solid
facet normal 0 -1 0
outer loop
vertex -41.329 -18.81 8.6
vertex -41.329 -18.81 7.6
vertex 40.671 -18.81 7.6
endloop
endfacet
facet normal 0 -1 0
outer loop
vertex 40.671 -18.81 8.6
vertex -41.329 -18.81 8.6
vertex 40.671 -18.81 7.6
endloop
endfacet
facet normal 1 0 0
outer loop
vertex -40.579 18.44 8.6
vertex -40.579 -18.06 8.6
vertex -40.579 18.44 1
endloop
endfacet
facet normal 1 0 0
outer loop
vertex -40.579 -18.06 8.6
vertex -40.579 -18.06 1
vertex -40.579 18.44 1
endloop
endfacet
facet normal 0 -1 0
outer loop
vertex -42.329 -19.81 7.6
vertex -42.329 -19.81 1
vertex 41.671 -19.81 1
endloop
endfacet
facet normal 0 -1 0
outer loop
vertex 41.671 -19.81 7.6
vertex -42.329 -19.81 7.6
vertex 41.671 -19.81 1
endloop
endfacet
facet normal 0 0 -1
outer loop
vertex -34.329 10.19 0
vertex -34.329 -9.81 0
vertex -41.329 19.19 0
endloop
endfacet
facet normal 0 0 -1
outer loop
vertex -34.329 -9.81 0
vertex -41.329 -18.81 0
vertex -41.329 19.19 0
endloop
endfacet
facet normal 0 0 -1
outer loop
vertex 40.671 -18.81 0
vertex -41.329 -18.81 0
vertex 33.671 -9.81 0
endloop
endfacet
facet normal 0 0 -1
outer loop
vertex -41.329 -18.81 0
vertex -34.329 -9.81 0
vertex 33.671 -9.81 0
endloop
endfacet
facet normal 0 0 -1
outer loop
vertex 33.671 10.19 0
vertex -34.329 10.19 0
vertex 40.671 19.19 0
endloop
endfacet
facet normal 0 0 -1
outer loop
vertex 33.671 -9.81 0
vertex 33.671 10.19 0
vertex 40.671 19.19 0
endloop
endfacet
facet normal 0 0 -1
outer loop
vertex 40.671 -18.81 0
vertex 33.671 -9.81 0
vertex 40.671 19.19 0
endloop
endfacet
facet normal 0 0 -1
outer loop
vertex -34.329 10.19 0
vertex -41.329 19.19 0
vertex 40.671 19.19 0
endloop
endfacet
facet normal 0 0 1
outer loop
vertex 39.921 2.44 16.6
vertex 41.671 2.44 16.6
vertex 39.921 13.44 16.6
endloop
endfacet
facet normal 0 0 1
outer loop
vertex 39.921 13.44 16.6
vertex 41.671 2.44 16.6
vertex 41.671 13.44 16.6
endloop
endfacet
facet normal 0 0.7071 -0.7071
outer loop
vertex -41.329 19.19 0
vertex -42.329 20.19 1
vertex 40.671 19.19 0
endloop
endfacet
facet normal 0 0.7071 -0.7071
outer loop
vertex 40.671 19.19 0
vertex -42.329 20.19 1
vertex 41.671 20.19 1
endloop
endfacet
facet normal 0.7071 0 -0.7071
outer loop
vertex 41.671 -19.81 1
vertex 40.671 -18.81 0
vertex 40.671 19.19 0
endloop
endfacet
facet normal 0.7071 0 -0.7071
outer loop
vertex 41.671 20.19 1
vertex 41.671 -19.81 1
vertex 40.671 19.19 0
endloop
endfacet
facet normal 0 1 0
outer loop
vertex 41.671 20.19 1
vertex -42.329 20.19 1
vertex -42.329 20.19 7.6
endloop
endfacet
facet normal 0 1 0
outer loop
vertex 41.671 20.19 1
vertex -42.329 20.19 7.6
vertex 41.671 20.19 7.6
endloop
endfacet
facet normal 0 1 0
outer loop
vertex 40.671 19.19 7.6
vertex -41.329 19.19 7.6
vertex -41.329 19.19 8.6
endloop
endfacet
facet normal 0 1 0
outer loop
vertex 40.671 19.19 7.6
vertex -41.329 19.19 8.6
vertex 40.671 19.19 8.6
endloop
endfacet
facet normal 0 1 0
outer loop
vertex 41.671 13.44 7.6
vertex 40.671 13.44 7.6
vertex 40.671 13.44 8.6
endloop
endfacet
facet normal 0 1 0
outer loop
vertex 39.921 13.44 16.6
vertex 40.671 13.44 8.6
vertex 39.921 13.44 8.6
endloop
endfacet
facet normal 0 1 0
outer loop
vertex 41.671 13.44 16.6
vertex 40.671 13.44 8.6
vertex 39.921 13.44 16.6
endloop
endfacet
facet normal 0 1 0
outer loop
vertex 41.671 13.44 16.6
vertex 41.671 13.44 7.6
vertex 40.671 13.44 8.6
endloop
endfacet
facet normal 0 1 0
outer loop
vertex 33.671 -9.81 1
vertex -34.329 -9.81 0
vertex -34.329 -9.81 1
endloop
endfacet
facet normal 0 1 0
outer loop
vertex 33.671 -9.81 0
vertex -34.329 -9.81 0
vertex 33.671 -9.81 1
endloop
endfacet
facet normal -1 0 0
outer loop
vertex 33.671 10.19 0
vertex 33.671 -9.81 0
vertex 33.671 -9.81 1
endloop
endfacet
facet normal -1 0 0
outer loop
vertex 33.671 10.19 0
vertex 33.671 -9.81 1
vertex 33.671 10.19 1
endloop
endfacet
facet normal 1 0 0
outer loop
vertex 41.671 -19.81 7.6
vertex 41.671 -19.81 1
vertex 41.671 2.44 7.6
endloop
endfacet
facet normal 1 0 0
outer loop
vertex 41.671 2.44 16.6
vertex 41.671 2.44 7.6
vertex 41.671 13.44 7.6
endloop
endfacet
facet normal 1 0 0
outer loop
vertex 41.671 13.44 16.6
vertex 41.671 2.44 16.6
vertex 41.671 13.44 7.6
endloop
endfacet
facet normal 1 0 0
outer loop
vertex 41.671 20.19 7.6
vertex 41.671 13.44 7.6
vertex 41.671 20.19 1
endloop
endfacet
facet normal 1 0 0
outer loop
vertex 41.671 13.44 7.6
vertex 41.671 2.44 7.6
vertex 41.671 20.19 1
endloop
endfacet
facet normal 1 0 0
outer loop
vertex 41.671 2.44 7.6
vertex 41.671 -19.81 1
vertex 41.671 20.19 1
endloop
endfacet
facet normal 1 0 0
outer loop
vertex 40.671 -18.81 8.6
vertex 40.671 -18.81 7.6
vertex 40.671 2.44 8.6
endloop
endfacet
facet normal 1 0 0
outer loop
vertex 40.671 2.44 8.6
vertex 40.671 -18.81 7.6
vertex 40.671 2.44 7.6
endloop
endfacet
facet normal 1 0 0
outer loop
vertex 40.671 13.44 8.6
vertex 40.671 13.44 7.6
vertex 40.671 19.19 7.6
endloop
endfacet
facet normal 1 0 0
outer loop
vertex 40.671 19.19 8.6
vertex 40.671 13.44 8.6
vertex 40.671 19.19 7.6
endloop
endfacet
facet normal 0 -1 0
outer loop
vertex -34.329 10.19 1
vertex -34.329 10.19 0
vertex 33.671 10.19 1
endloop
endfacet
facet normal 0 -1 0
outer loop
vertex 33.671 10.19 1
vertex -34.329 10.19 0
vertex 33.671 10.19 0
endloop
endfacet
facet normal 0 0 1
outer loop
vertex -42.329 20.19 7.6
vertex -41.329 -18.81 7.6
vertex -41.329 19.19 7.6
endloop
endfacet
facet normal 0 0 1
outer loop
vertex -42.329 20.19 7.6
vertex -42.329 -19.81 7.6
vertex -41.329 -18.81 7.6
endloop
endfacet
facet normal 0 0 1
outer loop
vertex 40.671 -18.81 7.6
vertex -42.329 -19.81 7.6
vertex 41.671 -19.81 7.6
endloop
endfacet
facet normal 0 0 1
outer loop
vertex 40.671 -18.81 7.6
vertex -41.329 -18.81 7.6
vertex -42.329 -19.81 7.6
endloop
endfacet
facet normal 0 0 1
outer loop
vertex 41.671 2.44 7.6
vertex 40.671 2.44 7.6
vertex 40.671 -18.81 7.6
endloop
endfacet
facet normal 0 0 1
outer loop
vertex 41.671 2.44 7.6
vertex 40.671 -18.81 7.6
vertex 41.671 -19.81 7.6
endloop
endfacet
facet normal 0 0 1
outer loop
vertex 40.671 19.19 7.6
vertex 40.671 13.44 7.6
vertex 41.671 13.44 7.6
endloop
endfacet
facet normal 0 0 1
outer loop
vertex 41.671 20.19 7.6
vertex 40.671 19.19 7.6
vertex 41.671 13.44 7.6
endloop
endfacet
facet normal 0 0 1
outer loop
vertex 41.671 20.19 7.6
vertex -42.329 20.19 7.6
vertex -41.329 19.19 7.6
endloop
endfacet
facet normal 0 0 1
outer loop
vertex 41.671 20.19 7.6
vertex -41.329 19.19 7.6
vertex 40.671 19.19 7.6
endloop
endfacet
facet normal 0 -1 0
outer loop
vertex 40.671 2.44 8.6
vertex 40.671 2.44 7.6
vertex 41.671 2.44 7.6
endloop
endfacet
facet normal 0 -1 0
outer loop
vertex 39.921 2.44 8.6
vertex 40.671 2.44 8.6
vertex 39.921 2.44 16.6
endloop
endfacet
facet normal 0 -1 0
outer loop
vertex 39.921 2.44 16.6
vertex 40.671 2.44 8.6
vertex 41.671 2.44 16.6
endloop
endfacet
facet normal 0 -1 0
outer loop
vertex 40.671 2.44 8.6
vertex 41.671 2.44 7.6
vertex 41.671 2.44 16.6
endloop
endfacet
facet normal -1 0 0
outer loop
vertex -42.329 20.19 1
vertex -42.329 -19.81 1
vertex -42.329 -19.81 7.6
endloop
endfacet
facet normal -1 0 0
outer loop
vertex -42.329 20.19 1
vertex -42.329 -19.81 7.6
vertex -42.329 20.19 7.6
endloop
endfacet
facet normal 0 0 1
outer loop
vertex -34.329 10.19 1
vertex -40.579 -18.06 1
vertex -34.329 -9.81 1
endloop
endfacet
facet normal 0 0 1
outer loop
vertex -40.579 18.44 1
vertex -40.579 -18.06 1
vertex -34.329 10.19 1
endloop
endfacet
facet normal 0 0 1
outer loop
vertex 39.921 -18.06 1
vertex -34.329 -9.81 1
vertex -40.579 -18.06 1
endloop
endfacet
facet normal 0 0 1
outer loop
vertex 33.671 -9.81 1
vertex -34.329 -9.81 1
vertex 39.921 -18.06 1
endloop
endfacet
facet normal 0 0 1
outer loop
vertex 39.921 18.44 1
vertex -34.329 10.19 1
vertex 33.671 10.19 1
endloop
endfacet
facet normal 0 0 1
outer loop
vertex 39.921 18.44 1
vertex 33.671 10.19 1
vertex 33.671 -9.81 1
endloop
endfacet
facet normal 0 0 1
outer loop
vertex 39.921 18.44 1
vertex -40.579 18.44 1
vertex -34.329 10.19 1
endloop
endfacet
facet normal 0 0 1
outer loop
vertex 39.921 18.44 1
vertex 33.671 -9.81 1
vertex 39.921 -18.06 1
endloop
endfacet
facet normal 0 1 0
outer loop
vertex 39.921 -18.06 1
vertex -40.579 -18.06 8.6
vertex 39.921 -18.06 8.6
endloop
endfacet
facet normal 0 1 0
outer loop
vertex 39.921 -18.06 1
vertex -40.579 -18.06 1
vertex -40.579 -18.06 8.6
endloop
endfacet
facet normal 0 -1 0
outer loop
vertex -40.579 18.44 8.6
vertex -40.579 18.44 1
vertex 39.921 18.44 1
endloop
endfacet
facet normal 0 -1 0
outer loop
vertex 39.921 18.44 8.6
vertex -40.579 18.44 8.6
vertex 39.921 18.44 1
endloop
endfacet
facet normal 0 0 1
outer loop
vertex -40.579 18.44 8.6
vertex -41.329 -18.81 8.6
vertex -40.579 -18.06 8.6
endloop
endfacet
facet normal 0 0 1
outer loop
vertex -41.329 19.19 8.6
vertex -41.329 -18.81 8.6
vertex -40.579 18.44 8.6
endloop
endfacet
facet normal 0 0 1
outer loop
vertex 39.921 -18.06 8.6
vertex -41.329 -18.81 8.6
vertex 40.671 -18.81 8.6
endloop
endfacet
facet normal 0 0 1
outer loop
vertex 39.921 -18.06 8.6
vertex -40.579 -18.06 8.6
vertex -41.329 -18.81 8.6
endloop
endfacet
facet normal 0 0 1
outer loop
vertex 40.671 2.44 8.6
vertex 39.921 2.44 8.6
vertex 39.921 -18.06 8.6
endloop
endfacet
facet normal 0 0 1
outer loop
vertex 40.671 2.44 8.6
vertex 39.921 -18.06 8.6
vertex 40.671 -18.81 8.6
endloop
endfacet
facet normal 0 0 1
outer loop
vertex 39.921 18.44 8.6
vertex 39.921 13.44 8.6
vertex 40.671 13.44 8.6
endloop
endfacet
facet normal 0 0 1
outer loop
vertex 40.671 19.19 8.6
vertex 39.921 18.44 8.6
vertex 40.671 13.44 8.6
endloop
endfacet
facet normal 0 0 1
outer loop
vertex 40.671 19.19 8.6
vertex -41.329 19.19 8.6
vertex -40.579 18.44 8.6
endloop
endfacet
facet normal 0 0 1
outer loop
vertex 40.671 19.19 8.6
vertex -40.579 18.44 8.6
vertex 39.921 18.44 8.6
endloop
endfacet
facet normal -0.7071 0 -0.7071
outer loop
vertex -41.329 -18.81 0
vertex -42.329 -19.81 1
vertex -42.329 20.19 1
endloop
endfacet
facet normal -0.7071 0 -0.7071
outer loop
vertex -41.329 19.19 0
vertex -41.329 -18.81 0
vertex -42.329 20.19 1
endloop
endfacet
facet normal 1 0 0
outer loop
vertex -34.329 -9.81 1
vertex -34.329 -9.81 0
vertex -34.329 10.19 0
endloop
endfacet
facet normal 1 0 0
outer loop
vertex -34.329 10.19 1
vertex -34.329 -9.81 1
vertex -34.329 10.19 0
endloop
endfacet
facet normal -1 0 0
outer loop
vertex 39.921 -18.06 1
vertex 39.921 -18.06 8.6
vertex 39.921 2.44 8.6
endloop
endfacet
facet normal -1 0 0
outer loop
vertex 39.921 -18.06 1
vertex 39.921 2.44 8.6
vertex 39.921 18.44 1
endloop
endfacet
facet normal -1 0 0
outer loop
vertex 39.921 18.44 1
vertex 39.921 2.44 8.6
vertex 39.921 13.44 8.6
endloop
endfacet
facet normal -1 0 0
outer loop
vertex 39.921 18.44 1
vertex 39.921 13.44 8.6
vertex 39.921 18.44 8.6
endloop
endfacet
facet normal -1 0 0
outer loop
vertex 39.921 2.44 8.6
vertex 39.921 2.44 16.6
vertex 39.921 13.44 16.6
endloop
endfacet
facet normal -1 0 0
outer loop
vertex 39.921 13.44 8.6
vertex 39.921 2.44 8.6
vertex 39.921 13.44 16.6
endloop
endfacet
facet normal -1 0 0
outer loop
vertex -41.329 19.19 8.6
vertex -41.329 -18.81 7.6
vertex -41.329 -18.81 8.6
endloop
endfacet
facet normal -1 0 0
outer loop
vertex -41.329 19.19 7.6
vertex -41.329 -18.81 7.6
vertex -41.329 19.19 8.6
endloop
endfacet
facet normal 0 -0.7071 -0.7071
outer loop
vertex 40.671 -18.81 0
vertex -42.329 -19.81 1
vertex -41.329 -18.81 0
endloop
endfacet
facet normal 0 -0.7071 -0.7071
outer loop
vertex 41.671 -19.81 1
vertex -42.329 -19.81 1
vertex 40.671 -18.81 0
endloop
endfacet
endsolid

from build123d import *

# Parameters (mm, degrees)
F0_W     = 84
F0_H     = 40
F0_R     = 1.45
F1_DEPTH = 1
F2_DEPTH = 7.6
F3_W     = 82
F3_H     = 38
F3_W_2   = 80.5
F3_H_2   = 36.5
F4_DEPTH = 1
F5_W     = 68
F5_H     = 20
F6_DEPTH = 5
F7_W     = 11
F7_H     = 13.6534924152
F8_DEPTH = 1.75
F9_SIZE  = 1


with BuildPart() as f1:
    # F0 (on Top) → F1 (new body)
    with BuildSketch(Plane.XY):
        with Locations((-0.3290896534, 0.19)):
            Rectangle(F0_W, F0_H)
        Polygon((-40.5790896534, 13.39), (-40.5790896534, 18.44), (-35.5290896534, 18.44), (34.8709103466, 18.44), (39.9209103466, 18.44), (39.9209103466, 13.39), (39.9209103466, -13.01), (39.9209103466, -18.06), (34.8709103466, -18.06), (-35.5290896534, -18.06), (-40.5790896534, -18.06), (-40.5790896534, -13.01), align=None, mode=Mode.SUBTRACT)
        with BuildLine():
            Line((34.8709103466, 18.44), (-35.5290896534, 18.44))
            Line((-35.5290896534, 18.44), (-35.5290896534, 15.89))
            ThreePointArc((-35.5290896534, 15.89), (-36.2613227005, 14.122233047), (-38.0290896534, 13.39))
            Line((-38.0290896534, 13.39), (-40.5790896534, 13.39))
            Line((-40.5790896534, 13.39), (-40.5790896534, -13.01))
            Line((-40.5790896534, -13.01), (-38.0290896534, -13.01))
            ThreePointArc((-38.0290896534, -13.01), (-36.2613227005, -13.742233047), (-35.5290896534, -15.51))
            Line((-35.5290896534, -15.51), (-35.5290896534, -18.06))
            Line((-35.5290896534, -18.06), (34.8709103466, -18.06))
            Line((34.8709103466, -18.06), (34.8709103466, -15.51))
            ThreePointArc((34.8709103466, -15.51), (35.6031433936, -13.742233047), (37.3709103466, -13.01))
            Line((37.3709103466, -13.01), (39.9209103466, -13.01))
            Line((39.9209103466, -13.01), (39.9209103466, 13.39))
            Line((39.9209103466, 13.39), (37.3709103466, 13.39))
            ThreePointArc((37.3709103466, 13.39), (35.6031433936, 14.122233047), (34.8709103466, 15.89))
            Line((34.8709103466, 15.89), (34.8709103466, 18.44))
        make_face()
        with BuildLine():
            Line((-35.5290896534, 18.44), (-40.5790896534, 18.44))
            Line((-40.5790896534, 18.44), (-40.5790896534, 13.39))
            Line((-40.5790896534, 13.39), (-38.0290896534, 13.39))
            ThreePointArc((-38.0290896534, 13.39), (-36.2613227005, 14.122233047), (-35.5290896534, 15.89))
            Line((-35.5290896534, 15.89), (-35.5290896534, 18.44))
        make_face()
        with Locations((-38.0290896534, 15.89)):
            Circle(F0_R, mode=Mode.SUBTRACT)
        with BuildLine():
            Line((39.9209103466, 18.44), (34.8709103466, 18.44))
            Line((34.8709103466, 18.44), (34.8709103466, 15.89))
            ThreePointArc((34.8709103466, 15.89), (35.6031433936, 14.122233047), (37.3709103466, 13.39))
            Line((37.3709103466, 13.39), (39.9209103466, 13.39))
            Line((39.9209103466, 13.39), (39.9209103466, 18.44))
        make_face()
        with Locations((37.3709103466, 15.89)):
            Circle(F0_R, mode=Mode.SUBTRACT)
        with BuildLine():
            Line((-38.0290896534, -13.01), (-40.5790896534, -13.01))
            Line((-40.5790896534, -13.01), (-40.5790896534, -18.06))
            Line((-40.5790896534, -18.06), (-35.5290896534, -18.06))
            Line((-35.5290896534, -18.06), (-35.5290896534, -15.51))
            ThreePointArc((-35.5290896534, -15.51), (-36.2613227005, -13.742233047), (-38.0290896534, -13.01))
        make_face()
        with Locations((-38.0290896534, -15.51)):
            Circle(F0_R, mode=Mode.SUBTRACT)
        with BuildLine():
            Line((39.9209103466, -18.06), (39.9209103466, -13.01))
            Line((39.9209103466, -13.01), (37.3709103466, -13.01))
            ThreePointArc((37.3709103466, -13.01), (35.6031433936, -13.742233047), (34.8709103466, -15.51))
            Line((34.8709103466, -15.51), (34.8709103466, -18.06))
            Line((34.8709103466, -18.06), (39.9209103466, -18.06))
        make_face()
        with Locations((37.3709103466, -15.51)):
            Circle(F0_R, mode=Mode.SUBTRACT)
        with Locations((-38.0290896534, 15.89)):
            Circle(F0_R)
        with Locations((-38.0290896534, -15.51)):
            Circle(F0_R)
        with Locations((37.3709103466, 15.89)):
            Circle(F0_R)
        with Locations((37.3709103466, -15.51)):
            Circle(F0_R)
    extrude(amount=F1_DEPTH)

    # F0 (on Top) → F2 (join)
    with BuildSketch(Plane.XY):
        with Locations((-0.3290896534, 0.19)):
            Rectangle(F0_W, F0_H)
        Polygon((-40.5790896534, 13.39), (-40.5790896534, 18.44), (-35.5290896534, 18.44), (34.8709103466, 18.44), (39.9209103466, 18.44), (39.9209103466, 13.39), (39.9209103466, -13.01), (39.9209103466, -18.06), (34.8709103466, -18.06), (-35.5290896534, -18.06), (-40.5790896534, -18.06), (-40.5790896534, -13.01), align=None, mode=Mode.SUBTRACT)
    extrude(amount=F2_DEPTH)

    # F3 (on face) → F4 (join)
    with BuildSketch(Plane.XY.offset(7.6)):
        with Locations((-0.3290896534, 0.19)):
            Rectangle(F3_W, F3_H)
        with Locations((-0.3290896534, 0.19)):
            Rectangle(F3_W_2, F3_H_2, mode=Mode.SUBTRACT)
    extrude(amount=F4_DEPTH)

    # F5 (on face) → F6 (cut)
    with BuildSketch(Plane.XY):
        with Locations((-0.3290896534, 0.19)):
            Rectangle(F5_W, F5_H)
    extrude(amount=F6_DEPTH, mode=Mode.SUBTRACT)

    # F7 (on face) → F8 (join)
    with BuildSketch(Plane.YZ.offset(41.6709103466)):
        with Locations((7.94, 9.7732537924)):
            Rectangle(F7_W, F7_H)
    extrude(amount=-F8_DEPTH)

    # F9
    f9_edges = [f1.edges().sort_by_distance(p)[0] for p in [
        (-0.32909, -19.81, 0),
        (41.67091, 0.19, 0),
        (-0.32909, 20.19, 0),
        (-42.32909, 0.19, 0),
    ]]
    chamfer(f9_edges, length=F9_SIZE)


solid = f1.part
